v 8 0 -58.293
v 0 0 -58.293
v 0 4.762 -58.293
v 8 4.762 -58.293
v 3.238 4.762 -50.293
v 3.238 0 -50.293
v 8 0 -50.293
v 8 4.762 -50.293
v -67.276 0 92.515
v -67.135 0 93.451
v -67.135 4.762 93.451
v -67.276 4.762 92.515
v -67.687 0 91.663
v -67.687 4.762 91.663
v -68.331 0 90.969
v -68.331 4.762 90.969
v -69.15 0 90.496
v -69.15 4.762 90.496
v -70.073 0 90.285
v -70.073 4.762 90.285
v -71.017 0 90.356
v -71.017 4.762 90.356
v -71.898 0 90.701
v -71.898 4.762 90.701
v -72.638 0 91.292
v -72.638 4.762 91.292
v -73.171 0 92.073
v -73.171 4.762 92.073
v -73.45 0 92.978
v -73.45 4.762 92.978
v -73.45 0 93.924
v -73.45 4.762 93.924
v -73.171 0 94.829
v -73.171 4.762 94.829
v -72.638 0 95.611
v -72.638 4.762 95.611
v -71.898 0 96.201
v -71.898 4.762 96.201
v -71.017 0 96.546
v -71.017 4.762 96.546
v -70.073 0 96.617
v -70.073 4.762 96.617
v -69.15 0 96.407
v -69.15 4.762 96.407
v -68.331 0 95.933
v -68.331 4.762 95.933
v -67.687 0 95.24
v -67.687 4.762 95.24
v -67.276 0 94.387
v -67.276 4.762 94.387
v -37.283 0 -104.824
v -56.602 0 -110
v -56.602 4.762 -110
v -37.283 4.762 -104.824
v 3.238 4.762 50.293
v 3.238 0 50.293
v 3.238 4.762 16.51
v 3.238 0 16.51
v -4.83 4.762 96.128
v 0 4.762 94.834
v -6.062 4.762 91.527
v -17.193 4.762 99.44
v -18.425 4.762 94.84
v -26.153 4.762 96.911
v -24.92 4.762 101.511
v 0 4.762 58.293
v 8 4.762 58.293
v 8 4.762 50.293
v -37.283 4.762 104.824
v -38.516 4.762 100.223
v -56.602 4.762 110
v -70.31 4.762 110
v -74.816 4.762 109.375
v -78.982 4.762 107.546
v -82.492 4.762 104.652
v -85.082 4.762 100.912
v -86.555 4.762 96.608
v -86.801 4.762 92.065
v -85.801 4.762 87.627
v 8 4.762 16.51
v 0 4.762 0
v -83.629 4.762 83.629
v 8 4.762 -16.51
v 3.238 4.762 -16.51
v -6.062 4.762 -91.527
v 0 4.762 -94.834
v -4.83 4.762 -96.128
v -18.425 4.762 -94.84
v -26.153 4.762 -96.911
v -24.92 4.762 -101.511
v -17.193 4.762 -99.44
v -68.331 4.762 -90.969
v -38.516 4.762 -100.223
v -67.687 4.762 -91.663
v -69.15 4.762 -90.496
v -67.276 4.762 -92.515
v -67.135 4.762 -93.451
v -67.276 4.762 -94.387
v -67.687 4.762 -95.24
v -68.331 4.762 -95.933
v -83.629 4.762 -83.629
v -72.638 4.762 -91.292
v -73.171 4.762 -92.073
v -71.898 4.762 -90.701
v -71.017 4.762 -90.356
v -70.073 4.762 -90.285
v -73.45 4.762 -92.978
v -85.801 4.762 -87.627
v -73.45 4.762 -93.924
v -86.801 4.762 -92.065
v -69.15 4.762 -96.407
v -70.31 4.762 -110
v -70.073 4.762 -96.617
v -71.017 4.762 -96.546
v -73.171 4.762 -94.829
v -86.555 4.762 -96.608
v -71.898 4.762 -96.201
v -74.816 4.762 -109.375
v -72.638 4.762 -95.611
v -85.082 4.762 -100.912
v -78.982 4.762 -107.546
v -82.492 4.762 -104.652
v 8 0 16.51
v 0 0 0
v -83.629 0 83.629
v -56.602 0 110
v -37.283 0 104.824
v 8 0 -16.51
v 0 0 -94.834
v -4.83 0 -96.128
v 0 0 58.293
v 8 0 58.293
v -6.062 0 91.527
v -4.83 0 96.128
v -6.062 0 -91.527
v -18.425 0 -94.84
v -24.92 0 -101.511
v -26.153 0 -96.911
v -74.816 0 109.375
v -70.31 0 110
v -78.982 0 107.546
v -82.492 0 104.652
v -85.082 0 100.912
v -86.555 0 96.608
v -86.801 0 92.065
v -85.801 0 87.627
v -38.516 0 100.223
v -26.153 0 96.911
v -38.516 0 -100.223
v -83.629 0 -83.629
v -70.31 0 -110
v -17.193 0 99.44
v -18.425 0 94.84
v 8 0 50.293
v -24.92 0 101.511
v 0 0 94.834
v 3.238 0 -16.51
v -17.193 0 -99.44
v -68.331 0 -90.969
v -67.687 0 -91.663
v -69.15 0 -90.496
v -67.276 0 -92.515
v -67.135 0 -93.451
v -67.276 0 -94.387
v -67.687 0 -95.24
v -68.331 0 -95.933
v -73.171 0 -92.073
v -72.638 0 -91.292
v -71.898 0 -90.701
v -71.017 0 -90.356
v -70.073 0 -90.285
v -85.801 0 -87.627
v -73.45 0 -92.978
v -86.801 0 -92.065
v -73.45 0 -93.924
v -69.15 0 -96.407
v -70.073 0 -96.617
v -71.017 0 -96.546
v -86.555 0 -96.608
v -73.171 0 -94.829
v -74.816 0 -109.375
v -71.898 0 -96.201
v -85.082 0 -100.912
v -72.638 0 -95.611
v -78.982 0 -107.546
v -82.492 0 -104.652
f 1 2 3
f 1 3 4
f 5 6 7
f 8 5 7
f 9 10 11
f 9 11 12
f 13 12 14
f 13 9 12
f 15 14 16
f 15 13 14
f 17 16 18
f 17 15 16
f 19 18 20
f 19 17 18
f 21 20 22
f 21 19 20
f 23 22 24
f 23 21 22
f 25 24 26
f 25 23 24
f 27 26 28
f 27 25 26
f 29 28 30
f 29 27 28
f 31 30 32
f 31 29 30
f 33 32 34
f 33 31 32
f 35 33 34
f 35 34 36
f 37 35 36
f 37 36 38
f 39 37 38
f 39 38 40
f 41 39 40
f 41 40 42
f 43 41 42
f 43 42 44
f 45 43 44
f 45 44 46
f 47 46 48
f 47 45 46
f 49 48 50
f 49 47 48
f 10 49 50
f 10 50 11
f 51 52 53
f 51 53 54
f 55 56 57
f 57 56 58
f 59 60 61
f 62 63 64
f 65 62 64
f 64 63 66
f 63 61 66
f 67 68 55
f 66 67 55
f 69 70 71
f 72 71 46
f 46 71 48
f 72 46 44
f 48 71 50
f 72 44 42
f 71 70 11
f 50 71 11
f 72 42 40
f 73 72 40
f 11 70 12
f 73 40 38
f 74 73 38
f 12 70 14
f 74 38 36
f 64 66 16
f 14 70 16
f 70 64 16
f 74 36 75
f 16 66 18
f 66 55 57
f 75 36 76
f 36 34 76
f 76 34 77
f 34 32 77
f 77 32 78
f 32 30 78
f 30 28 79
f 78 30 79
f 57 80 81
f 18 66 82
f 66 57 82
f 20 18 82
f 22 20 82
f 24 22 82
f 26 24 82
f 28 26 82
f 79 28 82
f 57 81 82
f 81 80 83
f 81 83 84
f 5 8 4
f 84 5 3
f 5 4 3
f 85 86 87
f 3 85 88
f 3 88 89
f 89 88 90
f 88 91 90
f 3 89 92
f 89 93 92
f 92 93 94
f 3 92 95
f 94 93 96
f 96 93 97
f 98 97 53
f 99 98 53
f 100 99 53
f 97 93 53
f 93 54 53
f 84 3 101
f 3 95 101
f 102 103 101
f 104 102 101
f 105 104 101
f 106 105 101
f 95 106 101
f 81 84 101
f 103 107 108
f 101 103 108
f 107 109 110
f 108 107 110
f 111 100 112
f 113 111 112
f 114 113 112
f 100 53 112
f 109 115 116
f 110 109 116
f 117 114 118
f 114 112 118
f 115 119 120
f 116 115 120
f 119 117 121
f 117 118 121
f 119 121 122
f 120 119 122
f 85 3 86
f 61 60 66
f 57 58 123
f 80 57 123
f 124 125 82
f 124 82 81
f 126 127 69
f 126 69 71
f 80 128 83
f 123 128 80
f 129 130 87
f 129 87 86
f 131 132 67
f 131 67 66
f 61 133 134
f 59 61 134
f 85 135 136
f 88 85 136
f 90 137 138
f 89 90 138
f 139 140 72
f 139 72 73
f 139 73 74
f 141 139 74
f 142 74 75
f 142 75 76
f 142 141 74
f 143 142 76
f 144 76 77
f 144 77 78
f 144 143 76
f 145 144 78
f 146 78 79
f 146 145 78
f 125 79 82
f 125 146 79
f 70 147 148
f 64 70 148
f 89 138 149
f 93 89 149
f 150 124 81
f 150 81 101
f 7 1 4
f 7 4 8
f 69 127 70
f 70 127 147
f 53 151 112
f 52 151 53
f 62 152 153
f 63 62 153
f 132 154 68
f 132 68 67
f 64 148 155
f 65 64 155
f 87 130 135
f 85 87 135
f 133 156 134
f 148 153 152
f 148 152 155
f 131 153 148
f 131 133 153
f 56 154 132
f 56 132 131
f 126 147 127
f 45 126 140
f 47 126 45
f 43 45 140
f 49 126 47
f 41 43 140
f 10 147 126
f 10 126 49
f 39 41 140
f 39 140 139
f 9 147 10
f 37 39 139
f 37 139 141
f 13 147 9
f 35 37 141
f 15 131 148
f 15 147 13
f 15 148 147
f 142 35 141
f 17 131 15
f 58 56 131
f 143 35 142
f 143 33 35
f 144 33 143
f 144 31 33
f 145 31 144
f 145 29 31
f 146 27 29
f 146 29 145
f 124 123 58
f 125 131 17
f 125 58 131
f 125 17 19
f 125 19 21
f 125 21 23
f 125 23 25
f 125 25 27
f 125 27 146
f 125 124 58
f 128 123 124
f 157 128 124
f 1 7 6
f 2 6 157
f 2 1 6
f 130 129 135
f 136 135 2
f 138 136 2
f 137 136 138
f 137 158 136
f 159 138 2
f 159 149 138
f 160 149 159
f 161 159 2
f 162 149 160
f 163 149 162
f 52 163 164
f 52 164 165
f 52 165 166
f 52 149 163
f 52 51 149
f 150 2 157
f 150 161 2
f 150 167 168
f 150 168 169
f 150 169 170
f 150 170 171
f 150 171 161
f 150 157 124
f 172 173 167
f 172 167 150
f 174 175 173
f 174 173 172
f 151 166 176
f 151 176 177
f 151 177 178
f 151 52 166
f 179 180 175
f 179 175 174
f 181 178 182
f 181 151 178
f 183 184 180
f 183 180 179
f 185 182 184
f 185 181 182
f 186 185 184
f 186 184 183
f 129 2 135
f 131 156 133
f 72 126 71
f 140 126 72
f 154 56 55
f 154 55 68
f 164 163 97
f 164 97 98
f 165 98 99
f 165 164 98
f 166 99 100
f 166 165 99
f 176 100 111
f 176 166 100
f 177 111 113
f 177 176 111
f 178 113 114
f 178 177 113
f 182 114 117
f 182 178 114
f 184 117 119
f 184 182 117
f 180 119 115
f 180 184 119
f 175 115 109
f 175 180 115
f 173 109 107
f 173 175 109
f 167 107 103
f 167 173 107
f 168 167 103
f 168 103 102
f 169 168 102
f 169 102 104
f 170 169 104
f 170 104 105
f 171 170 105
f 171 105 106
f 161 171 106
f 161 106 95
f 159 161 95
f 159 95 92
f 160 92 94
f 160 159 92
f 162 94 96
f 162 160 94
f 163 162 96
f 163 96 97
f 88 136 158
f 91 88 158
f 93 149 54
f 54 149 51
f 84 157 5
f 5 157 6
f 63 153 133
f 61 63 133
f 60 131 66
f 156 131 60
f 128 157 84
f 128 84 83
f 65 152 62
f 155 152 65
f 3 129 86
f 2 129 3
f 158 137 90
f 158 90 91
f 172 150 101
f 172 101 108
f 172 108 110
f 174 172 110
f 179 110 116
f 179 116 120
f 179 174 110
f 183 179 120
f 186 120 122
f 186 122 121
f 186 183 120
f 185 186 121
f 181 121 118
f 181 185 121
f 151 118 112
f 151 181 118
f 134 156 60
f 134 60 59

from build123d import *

# Parameters (mm, degrees)
SKETCH1_R           = 3.175
BOSS_EXTRUDE1_DEPTH = 4.7625
SKETCH3_W           = 4.7625
SKETCH3_H           = 33.783
CUT_EXTRUDE2_DEPTH  = 10


with BuildPart() as part:
    # Sketch1 → Boss-Extrude1 (new body)
    with BuildSketch(Plane(origin=(0, 0, 0), x_dir=(1, 0, 0), z_dir=(0, 1, 0))):
        with BuildLine():
            Line((0, 0), (-83.629476528, 83.629476528))
            ThreePointArc((-83.629476528, 83.629476528), (-85.081850373, 100.91197572), (-70.310188895, 110))
            Line((-70.310188895, 110), (-56.601944845, 110))
            Line((-56.601944845, 110), (0, 94.833554589))
            Line((0, 94.833554589), (0, 58.293))
            Line((0, 58.293), (8, 58.293))
            Line((8, 58.293), (8, -58.293))
            Line((8, -58.293), (0, -58.293))
            Line((0, -58.293), (0, -94.833554589))
            Line((0, -94.833554589), (-56.601944845, -110))
            Line((-56.601944845, -110), (-70.310188895, -110))
            ThreePointArc((-70.310188895, -110), (-85.081850373, -100.91197572), (-83.629476528, -83.629476528))
            Line((-83.629476528, -83.629476528), (0, 0))
        make_face()
        with Locations((-70.310188895, 93.451069294)):
            Circle(SKETCH1_R, mode=Mode.SUBTRACT)
        with Locations((-70.310188895, -93.451069294)):
            Circle(SKETCH1_R, mode=Mode.SUBTRACT)
    extrude(amount=BOSS_EXTRUDE1_DEPTH)

    # Sketch3 → Cut-Extrude2 (cut)
    with BuildSketch(Plane(origin=(0, 0, 0), x_dir=(1, 0, 0), z_dir=(0, 1, 0))):
        Polygon((-37.283428319, 104.823619098), (-24.920232031, 101.510910637), (-26.152857733, 96.910688889), (-38.516054022, 100.22339735), align=None)
        Polygon((-17.19282542, 99.440358276), (-4.829629131, 96.127649814), (-6.062254834, 91.527428067), (-18.425451123, 94.840136528), align=None)
        Polygon((-18.425451123, -94.840136528), (-6.062254834, -91.527428067), (-4.829629131, -96.127649814), (-17.19282542, -99.440358276), align=None)
        Polygon((-38.516054022, -100.22339735), (-26.152857733, -96.910688889), (-24.920232031, -101.510910637), (-37.283428319, -104.823619098), align=None)
        with Locations((5.61875, 33.4015)):
            Rectangle(SKETCH3_W, SKETCH3_H)
        with Locations((5.61875, -33.4015)):
            Rectangle(SKETCH3_W, SKETCH3_H)
    extrude(amount=CUT_EXTRUDE2_DEPTH, mode=Mode.SUBTRACT)


solid = part.part
